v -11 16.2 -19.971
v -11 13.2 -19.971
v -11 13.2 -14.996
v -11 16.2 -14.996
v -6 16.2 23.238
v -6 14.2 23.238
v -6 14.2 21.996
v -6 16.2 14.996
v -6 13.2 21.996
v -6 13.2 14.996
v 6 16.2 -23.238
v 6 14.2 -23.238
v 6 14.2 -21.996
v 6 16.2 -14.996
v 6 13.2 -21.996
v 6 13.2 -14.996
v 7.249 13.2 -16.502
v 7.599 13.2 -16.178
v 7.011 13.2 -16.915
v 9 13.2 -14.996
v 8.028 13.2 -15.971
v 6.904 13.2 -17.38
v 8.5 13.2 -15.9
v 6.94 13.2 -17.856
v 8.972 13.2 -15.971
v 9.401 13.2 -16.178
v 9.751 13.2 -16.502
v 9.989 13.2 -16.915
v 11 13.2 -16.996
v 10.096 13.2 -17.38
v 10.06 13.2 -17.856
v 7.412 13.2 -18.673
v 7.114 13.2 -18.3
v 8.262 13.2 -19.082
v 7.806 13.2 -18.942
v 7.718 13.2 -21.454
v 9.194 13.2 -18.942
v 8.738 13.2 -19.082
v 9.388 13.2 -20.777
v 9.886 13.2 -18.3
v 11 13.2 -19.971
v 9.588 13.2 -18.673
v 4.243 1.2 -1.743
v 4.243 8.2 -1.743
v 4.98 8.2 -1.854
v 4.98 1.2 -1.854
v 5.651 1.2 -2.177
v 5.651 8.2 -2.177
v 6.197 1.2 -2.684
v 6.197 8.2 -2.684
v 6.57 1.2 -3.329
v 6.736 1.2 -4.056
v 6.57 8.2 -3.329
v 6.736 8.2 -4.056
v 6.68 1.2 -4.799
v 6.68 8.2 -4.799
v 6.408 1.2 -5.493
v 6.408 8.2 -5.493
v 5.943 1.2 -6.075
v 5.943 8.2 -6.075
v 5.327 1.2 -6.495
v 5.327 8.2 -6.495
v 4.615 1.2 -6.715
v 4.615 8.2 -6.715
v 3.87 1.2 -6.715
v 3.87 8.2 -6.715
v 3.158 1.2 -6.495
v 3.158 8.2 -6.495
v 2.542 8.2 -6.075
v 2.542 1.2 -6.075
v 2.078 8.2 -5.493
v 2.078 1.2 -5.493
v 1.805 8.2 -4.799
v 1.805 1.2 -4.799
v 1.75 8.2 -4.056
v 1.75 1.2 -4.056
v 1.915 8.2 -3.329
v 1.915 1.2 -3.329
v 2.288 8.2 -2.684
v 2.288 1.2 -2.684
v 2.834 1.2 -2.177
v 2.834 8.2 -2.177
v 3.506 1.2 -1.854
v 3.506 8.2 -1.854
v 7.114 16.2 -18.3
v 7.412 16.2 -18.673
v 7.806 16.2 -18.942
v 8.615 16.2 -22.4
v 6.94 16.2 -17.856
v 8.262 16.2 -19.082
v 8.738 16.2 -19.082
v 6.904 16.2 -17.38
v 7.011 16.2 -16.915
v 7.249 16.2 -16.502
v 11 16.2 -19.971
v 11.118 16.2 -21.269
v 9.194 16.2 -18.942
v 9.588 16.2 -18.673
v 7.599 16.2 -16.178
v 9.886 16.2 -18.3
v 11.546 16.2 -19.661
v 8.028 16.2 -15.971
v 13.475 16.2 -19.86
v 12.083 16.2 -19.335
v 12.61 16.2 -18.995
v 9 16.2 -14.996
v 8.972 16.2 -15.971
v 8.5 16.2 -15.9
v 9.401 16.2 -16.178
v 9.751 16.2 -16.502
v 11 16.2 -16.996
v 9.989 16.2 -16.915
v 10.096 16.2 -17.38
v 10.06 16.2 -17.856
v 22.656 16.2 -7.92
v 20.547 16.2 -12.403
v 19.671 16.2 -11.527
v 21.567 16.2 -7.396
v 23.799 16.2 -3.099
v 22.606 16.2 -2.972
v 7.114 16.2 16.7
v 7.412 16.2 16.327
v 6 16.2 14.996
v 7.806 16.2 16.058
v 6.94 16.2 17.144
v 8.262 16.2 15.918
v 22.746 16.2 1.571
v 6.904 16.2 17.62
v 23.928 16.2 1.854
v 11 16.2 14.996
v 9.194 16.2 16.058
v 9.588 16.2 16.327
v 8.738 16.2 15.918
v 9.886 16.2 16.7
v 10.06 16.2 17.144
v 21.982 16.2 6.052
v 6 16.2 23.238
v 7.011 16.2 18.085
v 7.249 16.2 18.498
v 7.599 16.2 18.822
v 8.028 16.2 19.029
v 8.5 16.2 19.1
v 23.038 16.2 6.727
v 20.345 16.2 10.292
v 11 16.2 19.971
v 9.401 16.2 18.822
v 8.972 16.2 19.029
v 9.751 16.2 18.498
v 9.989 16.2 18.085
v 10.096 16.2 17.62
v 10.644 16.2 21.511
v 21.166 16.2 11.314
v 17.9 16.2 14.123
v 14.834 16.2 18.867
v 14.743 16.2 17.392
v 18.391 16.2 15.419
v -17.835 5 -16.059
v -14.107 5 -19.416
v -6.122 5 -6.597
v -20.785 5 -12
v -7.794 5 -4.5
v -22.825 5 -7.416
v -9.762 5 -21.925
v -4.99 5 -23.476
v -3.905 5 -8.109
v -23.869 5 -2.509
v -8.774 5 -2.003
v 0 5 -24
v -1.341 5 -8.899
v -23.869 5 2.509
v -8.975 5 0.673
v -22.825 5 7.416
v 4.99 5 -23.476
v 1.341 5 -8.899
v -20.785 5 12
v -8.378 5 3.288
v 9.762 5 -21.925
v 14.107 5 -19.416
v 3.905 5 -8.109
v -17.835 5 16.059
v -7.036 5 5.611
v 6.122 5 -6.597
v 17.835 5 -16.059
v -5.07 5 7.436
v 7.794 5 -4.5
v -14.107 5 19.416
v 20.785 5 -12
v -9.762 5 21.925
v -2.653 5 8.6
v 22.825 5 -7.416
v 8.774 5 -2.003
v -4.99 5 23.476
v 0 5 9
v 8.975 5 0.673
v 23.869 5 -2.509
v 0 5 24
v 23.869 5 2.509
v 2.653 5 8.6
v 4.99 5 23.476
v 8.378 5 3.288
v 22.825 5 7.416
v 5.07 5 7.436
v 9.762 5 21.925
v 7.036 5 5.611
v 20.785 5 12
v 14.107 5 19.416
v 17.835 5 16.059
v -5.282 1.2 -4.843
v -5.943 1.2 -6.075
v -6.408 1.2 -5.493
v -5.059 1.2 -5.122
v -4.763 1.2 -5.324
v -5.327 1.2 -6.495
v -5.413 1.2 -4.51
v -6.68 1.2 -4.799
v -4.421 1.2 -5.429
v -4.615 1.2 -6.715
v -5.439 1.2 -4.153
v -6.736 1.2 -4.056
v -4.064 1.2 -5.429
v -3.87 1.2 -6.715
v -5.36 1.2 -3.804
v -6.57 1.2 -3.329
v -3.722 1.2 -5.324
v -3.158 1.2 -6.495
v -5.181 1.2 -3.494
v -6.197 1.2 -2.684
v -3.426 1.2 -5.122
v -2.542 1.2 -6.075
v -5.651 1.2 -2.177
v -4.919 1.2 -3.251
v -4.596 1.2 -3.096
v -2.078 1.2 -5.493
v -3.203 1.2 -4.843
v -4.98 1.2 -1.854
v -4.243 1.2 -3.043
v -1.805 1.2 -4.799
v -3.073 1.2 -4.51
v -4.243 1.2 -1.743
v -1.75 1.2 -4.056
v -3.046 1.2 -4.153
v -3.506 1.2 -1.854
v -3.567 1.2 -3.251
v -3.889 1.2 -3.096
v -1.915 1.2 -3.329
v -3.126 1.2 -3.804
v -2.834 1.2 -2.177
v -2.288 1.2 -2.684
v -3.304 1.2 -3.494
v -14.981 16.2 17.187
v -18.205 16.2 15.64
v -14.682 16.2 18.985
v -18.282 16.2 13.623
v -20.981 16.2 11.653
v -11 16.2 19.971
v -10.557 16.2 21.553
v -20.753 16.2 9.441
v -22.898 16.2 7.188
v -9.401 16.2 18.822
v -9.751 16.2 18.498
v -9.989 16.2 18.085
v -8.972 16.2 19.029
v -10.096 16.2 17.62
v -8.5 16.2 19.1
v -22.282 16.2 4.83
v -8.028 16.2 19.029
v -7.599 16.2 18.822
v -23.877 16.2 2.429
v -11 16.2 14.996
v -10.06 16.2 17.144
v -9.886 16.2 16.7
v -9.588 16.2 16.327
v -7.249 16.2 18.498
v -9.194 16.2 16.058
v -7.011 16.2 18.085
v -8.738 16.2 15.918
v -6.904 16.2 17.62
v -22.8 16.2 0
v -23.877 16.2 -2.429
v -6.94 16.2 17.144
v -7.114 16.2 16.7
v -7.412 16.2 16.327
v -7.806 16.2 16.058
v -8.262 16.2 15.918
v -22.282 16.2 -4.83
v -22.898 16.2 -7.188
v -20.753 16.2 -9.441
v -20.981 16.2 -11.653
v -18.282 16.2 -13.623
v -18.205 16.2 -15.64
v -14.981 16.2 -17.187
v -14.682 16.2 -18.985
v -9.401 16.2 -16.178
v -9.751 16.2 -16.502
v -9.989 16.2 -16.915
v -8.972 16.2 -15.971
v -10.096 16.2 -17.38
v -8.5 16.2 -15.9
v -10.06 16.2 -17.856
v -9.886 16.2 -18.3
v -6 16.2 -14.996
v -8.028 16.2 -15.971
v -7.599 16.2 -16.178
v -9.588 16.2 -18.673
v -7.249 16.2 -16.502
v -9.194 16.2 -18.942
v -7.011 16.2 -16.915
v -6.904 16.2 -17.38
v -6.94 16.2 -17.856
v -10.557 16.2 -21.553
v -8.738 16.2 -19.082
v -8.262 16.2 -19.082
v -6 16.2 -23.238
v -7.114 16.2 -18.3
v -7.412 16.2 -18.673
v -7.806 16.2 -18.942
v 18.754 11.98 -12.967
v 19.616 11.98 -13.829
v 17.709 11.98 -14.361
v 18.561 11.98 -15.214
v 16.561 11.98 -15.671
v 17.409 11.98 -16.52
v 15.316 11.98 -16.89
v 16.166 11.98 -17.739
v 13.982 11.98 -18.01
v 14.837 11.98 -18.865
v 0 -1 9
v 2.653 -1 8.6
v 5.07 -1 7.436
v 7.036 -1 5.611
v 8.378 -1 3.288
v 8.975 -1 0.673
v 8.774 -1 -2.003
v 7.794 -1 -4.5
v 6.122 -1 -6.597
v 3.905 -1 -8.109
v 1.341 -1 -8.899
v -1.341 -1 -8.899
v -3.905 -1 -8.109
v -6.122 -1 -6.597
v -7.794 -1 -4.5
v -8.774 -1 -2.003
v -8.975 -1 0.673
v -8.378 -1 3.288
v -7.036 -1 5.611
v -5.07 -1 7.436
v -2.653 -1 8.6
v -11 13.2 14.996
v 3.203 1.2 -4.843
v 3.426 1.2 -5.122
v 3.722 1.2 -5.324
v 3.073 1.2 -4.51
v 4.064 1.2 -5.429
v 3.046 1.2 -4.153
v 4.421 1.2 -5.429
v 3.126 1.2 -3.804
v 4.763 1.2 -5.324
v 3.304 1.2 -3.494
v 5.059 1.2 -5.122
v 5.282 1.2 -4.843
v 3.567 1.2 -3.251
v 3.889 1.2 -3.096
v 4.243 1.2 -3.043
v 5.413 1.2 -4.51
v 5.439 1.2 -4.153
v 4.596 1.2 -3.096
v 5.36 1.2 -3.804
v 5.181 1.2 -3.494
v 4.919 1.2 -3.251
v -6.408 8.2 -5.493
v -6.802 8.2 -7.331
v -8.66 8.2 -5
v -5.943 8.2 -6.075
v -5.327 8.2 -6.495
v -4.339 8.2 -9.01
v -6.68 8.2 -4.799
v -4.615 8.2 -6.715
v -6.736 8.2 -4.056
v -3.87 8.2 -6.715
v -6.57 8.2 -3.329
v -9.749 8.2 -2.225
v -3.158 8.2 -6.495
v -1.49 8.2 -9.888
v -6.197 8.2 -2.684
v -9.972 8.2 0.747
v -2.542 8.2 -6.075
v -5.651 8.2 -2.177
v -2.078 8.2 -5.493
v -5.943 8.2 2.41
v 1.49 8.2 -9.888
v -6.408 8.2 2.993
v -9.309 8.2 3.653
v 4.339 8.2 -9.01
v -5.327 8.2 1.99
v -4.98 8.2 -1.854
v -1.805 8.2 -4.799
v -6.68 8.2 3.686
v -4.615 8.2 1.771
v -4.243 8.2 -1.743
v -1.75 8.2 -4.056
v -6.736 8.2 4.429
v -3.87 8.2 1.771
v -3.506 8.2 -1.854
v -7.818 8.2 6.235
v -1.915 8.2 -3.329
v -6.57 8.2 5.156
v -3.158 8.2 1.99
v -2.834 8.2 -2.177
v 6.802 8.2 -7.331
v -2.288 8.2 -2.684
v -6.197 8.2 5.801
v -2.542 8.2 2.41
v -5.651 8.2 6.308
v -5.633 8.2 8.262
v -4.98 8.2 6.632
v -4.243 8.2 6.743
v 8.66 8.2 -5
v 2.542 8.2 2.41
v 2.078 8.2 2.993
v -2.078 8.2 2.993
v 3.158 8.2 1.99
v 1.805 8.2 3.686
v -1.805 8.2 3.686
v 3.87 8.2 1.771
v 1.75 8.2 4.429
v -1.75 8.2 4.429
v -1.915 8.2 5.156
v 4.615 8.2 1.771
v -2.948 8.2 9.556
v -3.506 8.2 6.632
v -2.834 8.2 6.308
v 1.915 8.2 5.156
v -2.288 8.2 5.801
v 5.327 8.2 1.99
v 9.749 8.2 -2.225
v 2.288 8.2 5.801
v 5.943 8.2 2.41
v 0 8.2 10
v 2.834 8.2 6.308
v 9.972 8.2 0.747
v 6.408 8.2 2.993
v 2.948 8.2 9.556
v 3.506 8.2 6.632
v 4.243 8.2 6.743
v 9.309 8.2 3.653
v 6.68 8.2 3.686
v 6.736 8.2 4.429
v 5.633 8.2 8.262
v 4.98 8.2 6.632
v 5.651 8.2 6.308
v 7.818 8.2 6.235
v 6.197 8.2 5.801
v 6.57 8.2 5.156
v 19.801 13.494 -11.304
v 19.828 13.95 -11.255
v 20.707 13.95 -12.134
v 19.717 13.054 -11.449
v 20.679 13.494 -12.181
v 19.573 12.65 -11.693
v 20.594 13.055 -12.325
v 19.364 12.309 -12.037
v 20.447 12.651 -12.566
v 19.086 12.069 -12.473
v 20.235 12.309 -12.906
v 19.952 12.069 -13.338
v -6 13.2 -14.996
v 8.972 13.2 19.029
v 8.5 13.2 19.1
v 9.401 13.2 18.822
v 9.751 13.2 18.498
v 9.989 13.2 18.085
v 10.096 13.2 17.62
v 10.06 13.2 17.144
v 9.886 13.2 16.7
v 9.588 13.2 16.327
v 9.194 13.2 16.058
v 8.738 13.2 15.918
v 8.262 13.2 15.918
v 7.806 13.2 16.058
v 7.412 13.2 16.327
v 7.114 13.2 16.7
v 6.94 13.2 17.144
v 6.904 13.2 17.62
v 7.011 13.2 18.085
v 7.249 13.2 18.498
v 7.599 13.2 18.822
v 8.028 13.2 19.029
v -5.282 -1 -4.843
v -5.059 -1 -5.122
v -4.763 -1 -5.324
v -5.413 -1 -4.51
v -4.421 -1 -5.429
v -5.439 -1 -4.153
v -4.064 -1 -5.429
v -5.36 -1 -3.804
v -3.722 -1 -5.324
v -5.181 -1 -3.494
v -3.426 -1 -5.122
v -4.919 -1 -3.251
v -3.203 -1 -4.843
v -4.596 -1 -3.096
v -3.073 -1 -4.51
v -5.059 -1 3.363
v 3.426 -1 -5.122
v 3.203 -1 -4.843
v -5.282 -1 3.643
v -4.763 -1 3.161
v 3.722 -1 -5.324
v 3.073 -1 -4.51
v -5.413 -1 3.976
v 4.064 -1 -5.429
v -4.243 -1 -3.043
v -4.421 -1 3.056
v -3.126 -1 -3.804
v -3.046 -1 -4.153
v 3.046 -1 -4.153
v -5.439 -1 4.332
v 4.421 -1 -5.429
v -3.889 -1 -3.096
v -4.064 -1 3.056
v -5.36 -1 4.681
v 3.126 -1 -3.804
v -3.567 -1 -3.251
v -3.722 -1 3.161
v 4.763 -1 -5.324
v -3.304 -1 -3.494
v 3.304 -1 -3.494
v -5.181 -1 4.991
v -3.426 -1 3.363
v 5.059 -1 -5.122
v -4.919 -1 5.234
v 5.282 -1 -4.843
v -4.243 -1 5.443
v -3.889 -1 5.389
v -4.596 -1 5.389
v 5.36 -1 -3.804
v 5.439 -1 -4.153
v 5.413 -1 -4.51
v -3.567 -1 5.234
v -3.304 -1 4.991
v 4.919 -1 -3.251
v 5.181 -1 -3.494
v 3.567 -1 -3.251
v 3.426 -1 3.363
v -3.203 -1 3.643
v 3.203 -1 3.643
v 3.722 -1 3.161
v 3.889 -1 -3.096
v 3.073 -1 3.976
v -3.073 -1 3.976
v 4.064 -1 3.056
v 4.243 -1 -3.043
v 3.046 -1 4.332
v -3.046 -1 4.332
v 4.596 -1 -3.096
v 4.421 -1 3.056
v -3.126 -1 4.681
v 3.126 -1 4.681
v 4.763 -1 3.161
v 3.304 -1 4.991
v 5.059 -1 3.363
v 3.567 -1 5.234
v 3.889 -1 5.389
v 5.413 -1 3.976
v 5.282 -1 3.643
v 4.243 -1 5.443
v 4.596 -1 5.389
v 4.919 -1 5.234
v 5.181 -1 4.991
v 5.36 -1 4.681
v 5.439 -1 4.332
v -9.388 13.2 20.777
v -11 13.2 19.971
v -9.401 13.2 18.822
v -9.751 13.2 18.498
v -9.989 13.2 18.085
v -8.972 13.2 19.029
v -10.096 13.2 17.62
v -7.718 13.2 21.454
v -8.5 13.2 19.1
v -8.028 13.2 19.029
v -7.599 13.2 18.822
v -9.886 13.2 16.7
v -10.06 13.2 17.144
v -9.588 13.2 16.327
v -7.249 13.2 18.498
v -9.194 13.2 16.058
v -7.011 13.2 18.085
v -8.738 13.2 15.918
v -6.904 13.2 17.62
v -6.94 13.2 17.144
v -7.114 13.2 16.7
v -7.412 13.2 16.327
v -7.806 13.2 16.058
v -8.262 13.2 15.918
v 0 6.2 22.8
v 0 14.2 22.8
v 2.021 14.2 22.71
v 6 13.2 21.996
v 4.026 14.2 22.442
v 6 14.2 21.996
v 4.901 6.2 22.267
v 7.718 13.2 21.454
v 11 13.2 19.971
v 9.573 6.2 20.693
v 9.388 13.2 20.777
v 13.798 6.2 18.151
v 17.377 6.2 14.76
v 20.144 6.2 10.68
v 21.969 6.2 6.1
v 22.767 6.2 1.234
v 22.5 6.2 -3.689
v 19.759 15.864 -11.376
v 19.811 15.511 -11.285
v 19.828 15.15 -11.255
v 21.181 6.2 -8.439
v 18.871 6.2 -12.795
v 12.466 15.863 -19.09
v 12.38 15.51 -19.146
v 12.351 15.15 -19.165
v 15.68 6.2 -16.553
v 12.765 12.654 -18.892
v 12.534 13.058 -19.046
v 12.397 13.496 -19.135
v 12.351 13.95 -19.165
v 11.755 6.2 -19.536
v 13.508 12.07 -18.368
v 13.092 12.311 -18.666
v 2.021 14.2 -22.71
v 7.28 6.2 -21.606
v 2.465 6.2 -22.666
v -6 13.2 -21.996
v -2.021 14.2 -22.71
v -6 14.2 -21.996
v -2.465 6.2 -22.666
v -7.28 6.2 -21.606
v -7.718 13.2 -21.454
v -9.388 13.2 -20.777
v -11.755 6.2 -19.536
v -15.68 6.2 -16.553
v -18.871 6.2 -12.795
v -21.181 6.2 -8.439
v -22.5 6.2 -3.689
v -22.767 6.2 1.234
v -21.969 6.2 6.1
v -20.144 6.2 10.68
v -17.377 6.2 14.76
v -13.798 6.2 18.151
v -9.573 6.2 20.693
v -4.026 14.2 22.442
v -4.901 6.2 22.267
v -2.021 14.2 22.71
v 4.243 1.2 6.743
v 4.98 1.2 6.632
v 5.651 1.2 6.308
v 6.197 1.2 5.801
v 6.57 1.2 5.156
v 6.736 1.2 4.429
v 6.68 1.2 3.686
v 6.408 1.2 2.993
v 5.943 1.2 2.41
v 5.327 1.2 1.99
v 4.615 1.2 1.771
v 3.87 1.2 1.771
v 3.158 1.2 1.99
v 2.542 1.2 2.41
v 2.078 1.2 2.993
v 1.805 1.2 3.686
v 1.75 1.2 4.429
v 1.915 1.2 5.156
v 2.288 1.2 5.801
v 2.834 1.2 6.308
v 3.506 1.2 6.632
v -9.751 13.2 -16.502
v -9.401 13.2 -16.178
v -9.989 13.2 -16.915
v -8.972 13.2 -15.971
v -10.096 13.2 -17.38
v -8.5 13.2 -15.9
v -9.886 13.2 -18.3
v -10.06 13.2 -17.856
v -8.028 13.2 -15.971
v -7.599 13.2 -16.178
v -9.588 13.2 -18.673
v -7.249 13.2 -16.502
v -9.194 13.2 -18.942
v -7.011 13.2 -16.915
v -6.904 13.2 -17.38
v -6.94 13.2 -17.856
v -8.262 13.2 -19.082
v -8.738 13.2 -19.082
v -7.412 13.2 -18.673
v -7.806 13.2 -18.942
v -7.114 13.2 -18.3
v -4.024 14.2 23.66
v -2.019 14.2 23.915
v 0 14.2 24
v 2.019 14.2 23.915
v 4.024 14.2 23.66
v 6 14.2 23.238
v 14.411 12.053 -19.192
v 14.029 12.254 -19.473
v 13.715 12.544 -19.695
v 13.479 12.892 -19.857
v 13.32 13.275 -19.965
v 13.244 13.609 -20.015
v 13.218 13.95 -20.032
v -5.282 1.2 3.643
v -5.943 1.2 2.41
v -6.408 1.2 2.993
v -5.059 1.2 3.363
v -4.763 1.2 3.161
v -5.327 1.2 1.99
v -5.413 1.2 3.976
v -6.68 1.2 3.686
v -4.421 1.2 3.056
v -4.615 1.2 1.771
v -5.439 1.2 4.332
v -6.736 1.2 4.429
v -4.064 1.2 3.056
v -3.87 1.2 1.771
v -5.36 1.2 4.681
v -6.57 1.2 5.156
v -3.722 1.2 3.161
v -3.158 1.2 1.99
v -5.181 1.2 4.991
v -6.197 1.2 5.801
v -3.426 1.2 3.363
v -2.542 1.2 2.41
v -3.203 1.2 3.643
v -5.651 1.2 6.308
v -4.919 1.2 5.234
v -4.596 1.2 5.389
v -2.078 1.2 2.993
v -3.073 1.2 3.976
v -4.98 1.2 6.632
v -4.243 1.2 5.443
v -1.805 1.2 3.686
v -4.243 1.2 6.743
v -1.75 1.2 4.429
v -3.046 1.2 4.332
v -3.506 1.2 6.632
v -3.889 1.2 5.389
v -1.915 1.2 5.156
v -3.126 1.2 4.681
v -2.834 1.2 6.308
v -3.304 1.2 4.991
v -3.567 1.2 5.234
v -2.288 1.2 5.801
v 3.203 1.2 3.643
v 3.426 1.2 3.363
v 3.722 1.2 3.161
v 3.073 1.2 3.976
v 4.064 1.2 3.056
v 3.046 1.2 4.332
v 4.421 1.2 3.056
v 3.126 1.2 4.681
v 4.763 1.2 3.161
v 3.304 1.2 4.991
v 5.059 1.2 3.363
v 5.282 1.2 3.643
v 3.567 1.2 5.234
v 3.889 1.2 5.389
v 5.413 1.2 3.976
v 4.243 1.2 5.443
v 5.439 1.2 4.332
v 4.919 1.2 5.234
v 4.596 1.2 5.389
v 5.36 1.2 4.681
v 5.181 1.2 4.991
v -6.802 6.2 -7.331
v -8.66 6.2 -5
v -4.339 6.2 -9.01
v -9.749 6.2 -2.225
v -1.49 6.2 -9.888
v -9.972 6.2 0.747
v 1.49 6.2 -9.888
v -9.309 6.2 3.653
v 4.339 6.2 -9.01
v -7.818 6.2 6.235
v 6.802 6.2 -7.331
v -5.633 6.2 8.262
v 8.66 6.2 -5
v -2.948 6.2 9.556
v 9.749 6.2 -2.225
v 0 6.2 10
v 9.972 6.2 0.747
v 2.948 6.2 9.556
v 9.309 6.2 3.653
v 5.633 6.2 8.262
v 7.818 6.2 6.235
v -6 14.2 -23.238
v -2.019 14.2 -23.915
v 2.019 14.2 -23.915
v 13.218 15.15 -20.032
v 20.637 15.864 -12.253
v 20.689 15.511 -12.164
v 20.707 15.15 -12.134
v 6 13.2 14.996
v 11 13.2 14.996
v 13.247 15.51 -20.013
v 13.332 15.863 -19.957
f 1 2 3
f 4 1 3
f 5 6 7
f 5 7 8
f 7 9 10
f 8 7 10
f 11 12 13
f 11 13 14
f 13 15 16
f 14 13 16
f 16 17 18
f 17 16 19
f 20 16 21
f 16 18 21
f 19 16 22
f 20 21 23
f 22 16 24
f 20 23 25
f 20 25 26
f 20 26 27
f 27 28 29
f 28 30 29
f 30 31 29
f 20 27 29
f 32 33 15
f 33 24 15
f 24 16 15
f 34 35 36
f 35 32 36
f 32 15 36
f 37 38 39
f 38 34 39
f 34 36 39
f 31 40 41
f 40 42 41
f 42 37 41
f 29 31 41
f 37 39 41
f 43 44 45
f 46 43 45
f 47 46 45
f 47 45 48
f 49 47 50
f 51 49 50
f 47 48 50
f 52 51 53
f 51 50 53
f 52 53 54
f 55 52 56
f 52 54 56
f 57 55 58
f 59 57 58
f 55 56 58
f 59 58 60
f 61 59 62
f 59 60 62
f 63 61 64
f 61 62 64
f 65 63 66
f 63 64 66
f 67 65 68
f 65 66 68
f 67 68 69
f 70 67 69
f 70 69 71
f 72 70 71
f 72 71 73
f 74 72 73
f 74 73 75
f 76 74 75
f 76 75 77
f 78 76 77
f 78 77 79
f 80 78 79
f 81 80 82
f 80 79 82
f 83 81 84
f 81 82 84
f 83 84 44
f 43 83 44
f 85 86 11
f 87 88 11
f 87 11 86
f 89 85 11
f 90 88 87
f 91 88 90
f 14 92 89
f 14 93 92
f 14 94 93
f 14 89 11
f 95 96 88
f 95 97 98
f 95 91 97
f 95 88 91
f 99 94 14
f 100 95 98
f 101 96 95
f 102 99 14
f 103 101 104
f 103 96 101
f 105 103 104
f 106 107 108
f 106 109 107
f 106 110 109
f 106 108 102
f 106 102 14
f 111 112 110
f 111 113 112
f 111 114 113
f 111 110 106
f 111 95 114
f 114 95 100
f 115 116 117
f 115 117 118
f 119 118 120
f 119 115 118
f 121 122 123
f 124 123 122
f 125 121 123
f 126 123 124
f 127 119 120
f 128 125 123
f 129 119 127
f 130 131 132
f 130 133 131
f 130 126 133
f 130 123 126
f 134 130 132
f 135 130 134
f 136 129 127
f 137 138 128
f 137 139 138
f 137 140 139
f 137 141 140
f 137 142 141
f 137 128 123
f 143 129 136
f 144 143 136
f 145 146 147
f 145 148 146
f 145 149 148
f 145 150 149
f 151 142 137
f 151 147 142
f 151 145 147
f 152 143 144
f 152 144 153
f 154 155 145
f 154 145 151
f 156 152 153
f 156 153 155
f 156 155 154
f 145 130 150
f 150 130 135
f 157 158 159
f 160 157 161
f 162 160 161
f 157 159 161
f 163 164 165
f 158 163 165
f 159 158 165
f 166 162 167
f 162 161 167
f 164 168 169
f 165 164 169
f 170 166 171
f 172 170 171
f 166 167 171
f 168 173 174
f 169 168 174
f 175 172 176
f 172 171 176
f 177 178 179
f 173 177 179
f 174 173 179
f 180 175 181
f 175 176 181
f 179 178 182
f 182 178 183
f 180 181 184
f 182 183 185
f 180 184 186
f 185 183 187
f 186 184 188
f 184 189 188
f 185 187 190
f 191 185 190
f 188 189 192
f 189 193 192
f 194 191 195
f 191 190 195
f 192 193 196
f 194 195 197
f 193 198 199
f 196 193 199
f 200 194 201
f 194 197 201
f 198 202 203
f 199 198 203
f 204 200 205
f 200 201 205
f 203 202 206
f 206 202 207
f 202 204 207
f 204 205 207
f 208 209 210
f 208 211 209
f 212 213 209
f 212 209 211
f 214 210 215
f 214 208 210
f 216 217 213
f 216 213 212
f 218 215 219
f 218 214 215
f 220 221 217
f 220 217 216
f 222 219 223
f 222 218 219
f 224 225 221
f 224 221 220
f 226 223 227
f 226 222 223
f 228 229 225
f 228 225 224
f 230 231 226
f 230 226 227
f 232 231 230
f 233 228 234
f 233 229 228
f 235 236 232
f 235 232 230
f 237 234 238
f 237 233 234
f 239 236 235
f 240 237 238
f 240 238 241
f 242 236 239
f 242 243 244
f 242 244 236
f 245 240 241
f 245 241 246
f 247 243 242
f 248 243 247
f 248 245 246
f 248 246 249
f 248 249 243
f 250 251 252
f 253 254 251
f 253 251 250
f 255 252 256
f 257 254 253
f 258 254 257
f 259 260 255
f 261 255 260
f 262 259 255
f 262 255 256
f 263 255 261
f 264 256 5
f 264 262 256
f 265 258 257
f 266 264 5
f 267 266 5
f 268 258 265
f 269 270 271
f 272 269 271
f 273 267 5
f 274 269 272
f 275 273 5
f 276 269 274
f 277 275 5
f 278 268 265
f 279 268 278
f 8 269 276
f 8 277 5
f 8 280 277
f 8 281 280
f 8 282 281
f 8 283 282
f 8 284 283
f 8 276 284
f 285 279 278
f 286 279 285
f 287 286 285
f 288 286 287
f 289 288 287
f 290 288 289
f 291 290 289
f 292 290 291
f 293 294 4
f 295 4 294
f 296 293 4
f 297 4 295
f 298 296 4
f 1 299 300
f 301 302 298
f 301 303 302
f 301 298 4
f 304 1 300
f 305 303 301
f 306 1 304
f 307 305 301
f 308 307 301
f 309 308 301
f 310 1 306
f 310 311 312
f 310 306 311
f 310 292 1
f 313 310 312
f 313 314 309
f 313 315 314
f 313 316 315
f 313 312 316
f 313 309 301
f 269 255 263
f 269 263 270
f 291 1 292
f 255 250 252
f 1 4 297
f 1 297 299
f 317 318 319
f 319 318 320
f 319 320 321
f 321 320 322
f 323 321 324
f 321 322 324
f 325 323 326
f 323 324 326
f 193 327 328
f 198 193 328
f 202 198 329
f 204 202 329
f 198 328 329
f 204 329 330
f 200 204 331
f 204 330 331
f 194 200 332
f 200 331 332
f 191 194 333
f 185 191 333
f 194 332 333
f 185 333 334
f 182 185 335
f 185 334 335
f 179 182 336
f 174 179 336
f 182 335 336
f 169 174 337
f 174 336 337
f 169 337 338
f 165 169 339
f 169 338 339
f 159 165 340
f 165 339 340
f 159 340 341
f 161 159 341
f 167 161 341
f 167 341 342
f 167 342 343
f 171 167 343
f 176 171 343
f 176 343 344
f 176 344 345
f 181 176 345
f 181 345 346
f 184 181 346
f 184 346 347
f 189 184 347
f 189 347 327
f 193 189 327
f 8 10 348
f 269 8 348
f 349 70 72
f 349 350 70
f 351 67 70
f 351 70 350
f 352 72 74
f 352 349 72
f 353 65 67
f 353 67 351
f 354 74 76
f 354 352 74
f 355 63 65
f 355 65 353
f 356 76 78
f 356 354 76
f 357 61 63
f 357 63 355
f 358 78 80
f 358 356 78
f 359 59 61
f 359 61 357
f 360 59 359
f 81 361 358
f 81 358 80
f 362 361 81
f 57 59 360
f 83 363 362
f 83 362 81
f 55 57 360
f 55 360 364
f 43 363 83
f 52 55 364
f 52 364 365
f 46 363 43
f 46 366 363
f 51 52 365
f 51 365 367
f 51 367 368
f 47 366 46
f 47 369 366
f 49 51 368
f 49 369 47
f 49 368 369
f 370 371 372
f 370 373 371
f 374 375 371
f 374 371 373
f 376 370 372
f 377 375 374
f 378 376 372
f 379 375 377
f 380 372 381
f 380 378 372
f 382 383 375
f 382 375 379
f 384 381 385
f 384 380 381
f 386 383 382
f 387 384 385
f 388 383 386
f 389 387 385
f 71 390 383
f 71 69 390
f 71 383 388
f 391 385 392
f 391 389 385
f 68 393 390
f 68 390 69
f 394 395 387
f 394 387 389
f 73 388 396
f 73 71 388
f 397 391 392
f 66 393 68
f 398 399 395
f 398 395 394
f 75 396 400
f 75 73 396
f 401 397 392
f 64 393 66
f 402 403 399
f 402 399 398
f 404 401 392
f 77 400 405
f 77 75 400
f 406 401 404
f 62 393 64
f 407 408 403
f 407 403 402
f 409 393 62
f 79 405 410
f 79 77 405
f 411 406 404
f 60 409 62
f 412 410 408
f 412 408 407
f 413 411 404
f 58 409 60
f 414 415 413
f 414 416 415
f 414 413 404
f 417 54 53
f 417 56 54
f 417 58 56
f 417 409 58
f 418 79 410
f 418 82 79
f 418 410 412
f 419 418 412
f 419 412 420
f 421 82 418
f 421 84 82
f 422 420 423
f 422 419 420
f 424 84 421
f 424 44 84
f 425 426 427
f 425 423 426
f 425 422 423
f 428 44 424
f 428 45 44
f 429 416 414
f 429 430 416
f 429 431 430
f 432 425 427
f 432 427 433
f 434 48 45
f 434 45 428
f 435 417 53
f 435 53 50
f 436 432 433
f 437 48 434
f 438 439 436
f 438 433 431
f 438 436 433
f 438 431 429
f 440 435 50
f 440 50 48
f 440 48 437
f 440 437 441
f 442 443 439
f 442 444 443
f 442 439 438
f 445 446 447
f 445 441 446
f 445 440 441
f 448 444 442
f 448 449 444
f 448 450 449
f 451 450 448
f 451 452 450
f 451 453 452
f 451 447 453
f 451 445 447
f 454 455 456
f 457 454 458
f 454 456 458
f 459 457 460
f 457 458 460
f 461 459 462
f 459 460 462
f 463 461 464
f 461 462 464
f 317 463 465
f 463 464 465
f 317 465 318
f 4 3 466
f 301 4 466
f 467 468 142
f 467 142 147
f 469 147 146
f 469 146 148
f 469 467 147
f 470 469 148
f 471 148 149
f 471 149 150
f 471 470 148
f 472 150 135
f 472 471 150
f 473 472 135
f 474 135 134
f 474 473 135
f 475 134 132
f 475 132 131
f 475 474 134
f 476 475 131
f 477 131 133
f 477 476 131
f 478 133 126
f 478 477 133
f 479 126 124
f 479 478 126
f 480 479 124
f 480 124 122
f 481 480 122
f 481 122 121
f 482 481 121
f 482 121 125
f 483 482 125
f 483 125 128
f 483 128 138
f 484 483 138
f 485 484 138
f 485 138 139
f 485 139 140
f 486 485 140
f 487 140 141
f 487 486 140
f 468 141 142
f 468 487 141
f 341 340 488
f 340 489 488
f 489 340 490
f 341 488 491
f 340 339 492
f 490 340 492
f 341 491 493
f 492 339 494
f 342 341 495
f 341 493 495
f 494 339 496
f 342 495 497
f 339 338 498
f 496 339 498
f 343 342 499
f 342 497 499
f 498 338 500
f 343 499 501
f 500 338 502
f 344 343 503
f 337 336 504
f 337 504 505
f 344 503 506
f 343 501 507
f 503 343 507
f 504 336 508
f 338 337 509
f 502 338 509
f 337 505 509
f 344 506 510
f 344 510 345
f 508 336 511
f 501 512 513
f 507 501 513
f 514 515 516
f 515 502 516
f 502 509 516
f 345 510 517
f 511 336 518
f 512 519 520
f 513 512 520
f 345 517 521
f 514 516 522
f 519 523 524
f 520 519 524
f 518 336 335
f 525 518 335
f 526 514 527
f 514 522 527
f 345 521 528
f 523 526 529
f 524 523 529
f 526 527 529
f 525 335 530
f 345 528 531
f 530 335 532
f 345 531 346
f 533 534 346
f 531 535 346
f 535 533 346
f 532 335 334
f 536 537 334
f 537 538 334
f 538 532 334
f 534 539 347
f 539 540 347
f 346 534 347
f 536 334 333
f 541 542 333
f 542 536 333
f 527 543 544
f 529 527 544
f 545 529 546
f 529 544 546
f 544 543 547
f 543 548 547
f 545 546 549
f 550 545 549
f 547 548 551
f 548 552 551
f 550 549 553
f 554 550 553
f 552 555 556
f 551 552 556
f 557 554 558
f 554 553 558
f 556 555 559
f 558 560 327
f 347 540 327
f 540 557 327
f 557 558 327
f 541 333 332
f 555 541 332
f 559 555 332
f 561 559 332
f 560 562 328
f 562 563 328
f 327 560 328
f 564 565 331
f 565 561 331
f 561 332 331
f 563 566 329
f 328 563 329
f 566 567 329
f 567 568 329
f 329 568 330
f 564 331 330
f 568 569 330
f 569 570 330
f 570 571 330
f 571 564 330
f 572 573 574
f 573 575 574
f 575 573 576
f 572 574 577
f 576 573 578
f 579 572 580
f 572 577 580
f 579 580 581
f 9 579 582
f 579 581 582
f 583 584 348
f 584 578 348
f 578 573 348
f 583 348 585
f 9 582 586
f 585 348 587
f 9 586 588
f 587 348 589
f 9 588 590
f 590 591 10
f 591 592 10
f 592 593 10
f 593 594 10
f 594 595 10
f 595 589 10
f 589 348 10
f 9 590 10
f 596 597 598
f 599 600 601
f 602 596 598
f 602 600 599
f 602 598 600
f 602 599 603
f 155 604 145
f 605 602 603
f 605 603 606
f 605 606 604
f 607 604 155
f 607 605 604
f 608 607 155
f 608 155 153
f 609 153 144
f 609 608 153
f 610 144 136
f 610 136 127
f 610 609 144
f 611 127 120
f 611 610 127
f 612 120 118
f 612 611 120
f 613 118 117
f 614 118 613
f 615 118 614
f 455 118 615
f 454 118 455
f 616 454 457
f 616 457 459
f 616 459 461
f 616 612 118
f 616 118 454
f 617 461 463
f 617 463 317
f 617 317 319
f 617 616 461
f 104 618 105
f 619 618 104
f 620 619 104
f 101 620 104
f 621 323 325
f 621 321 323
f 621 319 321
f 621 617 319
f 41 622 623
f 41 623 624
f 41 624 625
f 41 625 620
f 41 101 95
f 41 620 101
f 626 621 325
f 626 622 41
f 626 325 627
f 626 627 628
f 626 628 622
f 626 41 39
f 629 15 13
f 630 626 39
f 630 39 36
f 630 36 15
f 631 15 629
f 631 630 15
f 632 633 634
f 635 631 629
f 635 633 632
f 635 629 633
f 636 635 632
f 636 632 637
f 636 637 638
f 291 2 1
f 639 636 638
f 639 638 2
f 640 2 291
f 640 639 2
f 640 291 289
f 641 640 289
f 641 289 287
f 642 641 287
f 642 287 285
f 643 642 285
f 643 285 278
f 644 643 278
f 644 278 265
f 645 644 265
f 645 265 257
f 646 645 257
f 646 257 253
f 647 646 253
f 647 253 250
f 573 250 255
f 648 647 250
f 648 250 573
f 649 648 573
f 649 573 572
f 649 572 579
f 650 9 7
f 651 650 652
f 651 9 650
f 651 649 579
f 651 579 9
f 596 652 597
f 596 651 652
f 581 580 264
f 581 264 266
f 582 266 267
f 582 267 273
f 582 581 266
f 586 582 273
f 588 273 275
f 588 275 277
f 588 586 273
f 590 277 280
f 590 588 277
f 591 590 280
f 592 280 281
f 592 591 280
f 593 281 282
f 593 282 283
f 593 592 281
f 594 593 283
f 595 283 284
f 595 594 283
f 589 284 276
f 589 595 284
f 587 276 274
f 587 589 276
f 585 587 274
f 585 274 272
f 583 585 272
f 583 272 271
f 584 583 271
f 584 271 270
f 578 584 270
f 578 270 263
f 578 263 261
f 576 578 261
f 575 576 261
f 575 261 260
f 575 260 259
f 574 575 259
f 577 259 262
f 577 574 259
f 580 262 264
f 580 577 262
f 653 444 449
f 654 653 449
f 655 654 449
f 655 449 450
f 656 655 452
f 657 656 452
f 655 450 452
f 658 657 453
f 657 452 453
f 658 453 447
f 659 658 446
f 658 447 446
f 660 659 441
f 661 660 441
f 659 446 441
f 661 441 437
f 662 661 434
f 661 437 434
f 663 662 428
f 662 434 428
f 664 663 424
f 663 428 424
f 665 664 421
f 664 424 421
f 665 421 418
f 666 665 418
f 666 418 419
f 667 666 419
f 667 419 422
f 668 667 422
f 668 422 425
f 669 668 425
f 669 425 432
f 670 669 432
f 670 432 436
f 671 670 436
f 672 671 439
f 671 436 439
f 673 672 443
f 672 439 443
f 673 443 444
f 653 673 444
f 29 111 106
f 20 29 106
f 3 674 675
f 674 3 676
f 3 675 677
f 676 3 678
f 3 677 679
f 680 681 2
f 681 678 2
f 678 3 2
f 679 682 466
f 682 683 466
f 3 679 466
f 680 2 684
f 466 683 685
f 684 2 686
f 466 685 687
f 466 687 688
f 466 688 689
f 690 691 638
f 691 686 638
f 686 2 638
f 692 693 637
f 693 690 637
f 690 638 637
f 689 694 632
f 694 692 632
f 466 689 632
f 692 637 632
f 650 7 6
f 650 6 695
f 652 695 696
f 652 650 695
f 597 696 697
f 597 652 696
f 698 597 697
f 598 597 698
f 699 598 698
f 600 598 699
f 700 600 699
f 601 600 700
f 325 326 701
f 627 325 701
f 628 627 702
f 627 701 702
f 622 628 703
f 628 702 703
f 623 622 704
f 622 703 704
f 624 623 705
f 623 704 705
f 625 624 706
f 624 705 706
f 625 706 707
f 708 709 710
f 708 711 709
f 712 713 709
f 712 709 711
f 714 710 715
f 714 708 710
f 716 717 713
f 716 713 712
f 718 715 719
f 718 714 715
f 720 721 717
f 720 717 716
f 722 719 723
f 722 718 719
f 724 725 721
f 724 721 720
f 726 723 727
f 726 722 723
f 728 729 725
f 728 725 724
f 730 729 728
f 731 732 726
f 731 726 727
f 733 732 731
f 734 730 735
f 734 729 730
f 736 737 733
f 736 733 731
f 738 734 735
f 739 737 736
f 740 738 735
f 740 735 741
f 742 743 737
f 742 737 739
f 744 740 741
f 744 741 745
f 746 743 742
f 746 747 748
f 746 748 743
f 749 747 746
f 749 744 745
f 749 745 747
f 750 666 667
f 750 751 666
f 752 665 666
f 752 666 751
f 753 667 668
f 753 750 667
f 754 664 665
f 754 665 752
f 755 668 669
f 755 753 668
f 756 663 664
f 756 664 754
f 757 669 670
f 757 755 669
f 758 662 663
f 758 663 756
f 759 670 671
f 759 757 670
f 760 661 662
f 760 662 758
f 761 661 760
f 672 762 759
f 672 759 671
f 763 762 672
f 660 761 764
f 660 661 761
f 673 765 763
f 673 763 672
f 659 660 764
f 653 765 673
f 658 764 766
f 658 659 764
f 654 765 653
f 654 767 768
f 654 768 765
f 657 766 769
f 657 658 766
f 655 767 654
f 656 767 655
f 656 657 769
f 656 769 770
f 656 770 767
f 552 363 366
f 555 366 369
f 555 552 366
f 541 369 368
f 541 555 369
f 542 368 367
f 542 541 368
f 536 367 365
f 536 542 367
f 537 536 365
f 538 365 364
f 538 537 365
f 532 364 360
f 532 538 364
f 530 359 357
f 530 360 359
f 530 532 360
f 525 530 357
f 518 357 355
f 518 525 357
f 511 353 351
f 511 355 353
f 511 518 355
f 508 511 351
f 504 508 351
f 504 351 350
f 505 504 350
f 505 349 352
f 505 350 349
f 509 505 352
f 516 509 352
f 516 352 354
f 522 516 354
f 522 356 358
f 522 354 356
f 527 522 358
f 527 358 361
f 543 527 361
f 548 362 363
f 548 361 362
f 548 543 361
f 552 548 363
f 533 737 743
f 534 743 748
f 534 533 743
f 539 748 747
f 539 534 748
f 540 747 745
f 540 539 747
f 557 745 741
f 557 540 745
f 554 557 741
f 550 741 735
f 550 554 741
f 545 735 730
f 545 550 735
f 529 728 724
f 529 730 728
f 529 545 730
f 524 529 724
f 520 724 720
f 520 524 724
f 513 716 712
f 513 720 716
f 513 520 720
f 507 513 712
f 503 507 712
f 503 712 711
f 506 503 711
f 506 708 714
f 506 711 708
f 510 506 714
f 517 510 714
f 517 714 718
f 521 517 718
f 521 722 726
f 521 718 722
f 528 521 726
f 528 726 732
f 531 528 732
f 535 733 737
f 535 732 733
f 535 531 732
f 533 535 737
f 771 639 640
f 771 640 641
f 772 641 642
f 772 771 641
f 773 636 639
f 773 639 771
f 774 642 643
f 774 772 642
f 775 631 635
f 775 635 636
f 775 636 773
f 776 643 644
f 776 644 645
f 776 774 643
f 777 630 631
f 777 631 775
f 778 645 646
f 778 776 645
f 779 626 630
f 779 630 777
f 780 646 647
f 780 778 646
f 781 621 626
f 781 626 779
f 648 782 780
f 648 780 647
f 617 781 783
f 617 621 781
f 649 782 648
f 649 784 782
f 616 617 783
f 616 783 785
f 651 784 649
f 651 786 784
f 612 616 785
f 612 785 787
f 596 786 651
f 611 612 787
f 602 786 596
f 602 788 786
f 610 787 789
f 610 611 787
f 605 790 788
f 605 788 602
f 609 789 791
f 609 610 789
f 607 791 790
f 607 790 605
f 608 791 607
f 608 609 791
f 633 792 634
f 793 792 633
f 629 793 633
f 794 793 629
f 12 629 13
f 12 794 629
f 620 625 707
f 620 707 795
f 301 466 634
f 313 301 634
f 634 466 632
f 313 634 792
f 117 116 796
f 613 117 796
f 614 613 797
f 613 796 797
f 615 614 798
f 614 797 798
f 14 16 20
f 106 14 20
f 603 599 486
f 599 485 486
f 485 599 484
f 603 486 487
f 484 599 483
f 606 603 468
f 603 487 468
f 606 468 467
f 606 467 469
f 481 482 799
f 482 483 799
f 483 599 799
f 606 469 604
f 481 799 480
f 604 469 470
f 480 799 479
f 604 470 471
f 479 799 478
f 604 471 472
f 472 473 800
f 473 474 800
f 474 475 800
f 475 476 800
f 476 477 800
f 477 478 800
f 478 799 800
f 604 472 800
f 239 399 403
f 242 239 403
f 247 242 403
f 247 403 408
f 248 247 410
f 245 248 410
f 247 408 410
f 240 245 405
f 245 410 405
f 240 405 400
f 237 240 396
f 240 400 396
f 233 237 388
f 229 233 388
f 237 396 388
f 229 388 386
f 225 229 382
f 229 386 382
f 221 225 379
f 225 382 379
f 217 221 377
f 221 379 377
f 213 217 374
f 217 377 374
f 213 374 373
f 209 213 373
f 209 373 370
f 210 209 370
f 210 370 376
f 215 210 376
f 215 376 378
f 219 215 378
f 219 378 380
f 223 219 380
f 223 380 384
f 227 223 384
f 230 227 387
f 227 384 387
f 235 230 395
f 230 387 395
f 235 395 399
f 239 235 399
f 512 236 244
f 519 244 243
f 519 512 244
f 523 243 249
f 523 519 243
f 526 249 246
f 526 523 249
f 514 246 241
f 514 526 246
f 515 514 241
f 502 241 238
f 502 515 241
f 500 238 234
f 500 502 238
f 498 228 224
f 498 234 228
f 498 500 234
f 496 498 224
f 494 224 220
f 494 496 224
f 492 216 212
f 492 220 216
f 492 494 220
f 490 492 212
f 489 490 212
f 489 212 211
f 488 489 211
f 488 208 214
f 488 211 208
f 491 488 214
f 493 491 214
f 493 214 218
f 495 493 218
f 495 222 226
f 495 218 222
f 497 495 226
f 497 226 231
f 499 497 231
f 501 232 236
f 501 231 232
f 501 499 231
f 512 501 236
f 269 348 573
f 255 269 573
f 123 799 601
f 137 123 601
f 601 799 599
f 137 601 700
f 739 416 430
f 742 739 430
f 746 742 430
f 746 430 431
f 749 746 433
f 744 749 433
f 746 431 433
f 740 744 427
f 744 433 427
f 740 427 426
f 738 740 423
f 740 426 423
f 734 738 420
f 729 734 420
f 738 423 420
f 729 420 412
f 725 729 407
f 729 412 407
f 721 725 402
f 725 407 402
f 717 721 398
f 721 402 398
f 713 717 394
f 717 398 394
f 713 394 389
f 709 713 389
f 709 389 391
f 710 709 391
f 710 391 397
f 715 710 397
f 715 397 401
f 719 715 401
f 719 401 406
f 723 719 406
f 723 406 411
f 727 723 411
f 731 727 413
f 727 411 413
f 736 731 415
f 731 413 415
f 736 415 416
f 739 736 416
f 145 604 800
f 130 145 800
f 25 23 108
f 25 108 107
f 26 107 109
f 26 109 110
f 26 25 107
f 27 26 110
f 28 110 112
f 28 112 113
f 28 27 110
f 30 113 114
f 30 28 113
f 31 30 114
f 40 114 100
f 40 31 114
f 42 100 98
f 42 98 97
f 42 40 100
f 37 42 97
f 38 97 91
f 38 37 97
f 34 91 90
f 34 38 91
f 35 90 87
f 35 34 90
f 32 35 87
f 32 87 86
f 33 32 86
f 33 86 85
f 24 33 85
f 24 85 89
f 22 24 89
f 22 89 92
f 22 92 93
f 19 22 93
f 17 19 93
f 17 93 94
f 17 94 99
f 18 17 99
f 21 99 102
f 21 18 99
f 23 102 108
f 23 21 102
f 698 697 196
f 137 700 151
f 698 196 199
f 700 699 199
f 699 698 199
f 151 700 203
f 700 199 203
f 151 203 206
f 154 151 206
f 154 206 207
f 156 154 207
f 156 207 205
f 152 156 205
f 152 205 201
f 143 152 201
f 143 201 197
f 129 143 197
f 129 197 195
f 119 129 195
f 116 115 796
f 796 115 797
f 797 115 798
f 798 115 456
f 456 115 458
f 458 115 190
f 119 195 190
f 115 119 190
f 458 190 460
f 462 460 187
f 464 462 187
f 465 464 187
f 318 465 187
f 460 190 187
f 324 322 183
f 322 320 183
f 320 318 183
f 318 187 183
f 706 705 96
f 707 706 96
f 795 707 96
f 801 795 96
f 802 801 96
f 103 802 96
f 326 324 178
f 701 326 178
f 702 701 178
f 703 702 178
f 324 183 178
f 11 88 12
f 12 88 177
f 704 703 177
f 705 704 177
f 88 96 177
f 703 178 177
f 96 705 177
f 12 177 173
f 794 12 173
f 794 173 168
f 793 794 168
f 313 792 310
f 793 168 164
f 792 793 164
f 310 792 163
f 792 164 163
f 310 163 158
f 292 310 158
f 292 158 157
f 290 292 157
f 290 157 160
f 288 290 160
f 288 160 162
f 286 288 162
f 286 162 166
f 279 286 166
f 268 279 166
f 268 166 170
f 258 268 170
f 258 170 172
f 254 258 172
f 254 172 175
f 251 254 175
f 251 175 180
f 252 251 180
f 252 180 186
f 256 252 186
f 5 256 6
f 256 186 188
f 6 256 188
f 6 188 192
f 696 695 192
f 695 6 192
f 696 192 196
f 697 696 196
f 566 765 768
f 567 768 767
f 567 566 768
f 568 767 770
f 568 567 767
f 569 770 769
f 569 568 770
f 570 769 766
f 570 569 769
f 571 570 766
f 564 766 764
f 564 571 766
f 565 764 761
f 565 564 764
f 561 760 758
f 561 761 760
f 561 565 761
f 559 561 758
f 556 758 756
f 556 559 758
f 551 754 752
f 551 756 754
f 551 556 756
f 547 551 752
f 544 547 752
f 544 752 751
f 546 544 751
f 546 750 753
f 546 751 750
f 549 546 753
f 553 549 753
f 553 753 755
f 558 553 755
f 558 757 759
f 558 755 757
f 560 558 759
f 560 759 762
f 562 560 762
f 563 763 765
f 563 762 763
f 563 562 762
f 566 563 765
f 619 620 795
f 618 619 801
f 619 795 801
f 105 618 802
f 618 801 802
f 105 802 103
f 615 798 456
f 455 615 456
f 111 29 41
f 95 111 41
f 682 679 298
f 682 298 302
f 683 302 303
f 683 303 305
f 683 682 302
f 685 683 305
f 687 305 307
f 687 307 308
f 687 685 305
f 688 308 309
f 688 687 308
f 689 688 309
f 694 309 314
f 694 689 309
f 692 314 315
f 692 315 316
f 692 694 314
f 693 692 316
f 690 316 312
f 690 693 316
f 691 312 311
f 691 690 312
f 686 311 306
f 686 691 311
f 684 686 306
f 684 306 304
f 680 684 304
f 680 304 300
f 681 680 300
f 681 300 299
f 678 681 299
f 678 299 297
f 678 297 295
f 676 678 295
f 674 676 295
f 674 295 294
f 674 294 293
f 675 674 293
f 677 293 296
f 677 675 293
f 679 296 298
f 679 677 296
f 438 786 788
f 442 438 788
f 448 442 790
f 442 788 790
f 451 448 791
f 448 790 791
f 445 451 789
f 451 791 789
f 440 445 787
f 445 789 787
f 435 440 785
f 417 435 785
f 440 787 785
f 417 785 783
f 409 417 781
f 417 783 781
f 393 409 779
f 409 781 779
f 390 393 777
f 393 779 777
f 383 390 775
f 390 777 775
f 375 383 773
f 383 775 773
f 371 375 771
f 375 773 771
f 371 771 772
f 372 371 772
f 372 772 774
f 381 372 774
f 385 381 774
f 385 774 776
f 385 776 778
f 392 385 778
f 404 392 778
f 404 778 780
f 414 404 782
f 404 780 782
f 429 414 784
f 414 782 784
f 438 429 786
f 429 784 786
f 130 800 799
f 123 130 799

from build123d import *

# Parameters (mm, degrees)
SKETCH1_R           = 9
SKETCH1_R_2         = 1.2
BOSS_EXTRUDE1_DEPTH = 5
SKETCH2_R           = 24
BOSS_EXTRUDE2_DEPTH = 1.2
SKETCH4_R           = 1.2
CUT_EXTRUDE1_DEPTH  = 35.307433597
SKETCH5_R           = 10
SKETCH5_R_2         = 1.2
BOSS_EXTRUDE4_DEPTH = 2
SKETCH6_R           = 24
SKETCH6_R_2         = 22.8
BOSS_EXTRUDE5_DEPTH = 10
SKETCH7_W           = 12
SKETCH7_H           = 48
CUT_EXTRUDE2_DEPTH  = 2
BOSS_EXTRUDE6_START = -3
SKETCH9_R           = 1.6
BOSS_EXTRUDE6_DEPTH = 3
SKETCH10_R          = 2.5
CUT_EXTRUDE3_DEPTH  = 7
BOSS_EXTRUDE7_START = -1
SKETCH1_2_R         = 9
SKETCH1_2_R_2       = 1.2
BOSS_EXTRUDE7_DEPTH = 1
CUT_EXTRUDE4_DEPTH  = 5
SKETCH18_OUTSIDE_W  = 64.006
SKETCH18_OUTSIDE_H  = 64.006
SKETCH18_OUTSIDE_R  = 24
CUT_EXTRUDE5_DEPTH  = 5


with BuildPart() as part:
    # Sketch1 → Boss-Extrude1 (new body)
    with BuildSketch(Plane(origin=(0, 0, 0), x_dir=(1, 0, 0), z_dir=(0, 1, 0))):
        Circle(SKETCH1_R)
        with Locations((4.242640687, 4.242640687)):
            Circle(SKETCH1_R_2, mode=Mode.SUBTRACT)
        with Locations((-4.242640687, 4.242640687)):
            Circle(SKETCH1_R_2, mode=Mode.SUBTRACT)
        with Locations((4.242640687, -4.242640687)):
            Circle(SKETCH1_R_2, mode=Mode.SUBTRACT)
        with Locations((-4.242640687, -4.242640687)):
            Circle(SKETCH1_R_2, mode=Mode.SUBTRACT)
    extrude(amount=BOSS_EXTRUDE1_DEPTH)

    # Sketch2 → Boss-Extrude2 (add)
    with BuildSketch(Plane(origin=(0, 5, 0), x_dir=(1, 0, 0), z_dir=(0, 1, 0))):
        Circle(SKETCH2_R)
    extrude(amount=BOSS_EXTRUDE2_DEPTH)

    # Sketch4 → Cut-Extrude1 (cut, through all)
    with BuildSketch(Plane.XZ.offset(-5)):
        with Locations((-4.242640687, -4.242640687)):
            Circle(SKETCH4_R)
        with Locations((4.242640687, -4.242640687)):
            Circle(SKETCH4_R)
        with Locations((4.242640687, 4.242640687)):
            Circle(SKETCH4_R)
        with Locations((-4.242640687, 4.242640687)):
            Circle(SKETCH4_R)
    extrude(amount=-CUT_EXTRUDE1_DEPTH, mode=Mode.SUBTRACT)

    # Sketch5 → Boss-Extrude4 (add)
    with BuildSketch(Plane(origin=(0, 6.2, 0), x_dir=(1, 0, 0), z_dir=(0, 1, 0))):
        Circle(SKETCH5_R)
        with Locations((4.242640687, -4.242640687)):
            Circle(SKETCH5_R_2, mode=Mode.SUBTRACT)
        with Locations((-4.242640687, -4.242640687)):
            Circle(SKETCH5_R_2, mode=Mode.SUBTRACT)
        with Locations((-4.242640687, 4.242640687)):
            Circle(SKETCH5_R_2, mode=Mode.SUBTRACT)
        with Locations((4.242640687, 4.242640687)):
            Circle(SKETCH5_R_2, mode=Mode.SUBTRACT)
    extrude(amount=BOSS_EXTRUDE4_DEPTH)

    # Sketch6 → Boss-Extrude5 (add)
    with BuildSketch(Plane(origin=(0, 6.2, 0), x_dir=(1, 0, 0), z_dir=(0, 1, 0))):
        Circle(SKETCH6_R)
        Circle(SKETCH6_R_2, mode=Mode.SUBTRACT)
    extrude(amount=BOSS_EXTRUDE5_DEPTH)

    # Sketch7 → Cut-Extrude2 (cut)
    with BuildSketch(Plane(origin=(0, 16.2, 0), x_dir=(1, 0, 0), z_dir=(0, 1, 0))):
        Rectangle(SKETCH7_W, SKETCH7_H)
    extrude(amount=-CUT_EXTRUDE2_DEPTH, mode=Mode.SUBTRACT)

    # Sketch9 → Boss-Extrude6 (add)
    # profile 1 of 4: a face of its own
    with BuildSketch(Plane(origin=(0, 16.2, 0), x_dir=(1, 0, 0), z_dir=(0, 1, 0)).offset(BOSS_EXTRUDE6_START)):
        with BuildLine():
            Line((-6, 14.996363336), (-6, 21.996363336))
            ThreePointArc((-6, 21.996363336), (-8.560113637, 21.132071704), (-11, 19.970978944))
            Line((-11, 19.970978944), (-11, 14.996363336))
            Line((-11, 14.996363336), (-6, 14.996363336))
        make_face()
        with Locations((-8.5, 17.5)):
            Circle(SKETCH9_R, mode=Mode.SUBTRACT)
    # profile 2 of 4: a face of its own
    with BuildSketch(Plane(origin=(0, 16.2, 0), x_dir=(1, 0, 0), z_dir=(0, 1, 0)).offset(BOSS_EXTRUDE6_START)):
        with BuildLine():
            ThreePointArc((11, 19.970978944), (8.560113637, 21.132071704), (6, 21.996363336))
            Line((6, 21.996363336), (6, 14.996363336))
            Line((6, 14.996363336), (11, 14.996363336))
            Line((11, 14.996363336), (11, 19.970978944))
        make_face()
        with Locations((8.5, 17.5)):
            Circle(SKETCH9_R, mode=Mode.SUBTRACT)
    # profile 3 of 4: a face of its own
    with BuildSketch(Plane(origin=(0, 16.2, 0), x_dir=(1, 0, 0), z_dir=(0, 1, 0)).offset(BOSS_EXTRUDE6_START)):
        with BuildLine():
            Line((-11, -14.996363336), (-11, -19.970978944))
            ThreePointArc((-11, -19.970978944), (-8.560113637, -21.132071704), (-6, -21.996363336))
            Line((-6, -21.996363336), (-6, -14.996363336))
            Line((-6, -14.996363336), (-11, -14.996363336))
        make_face()
        with Locations((-8.5, -17.5)):
            Circle(SKETCH9_R, mode=Mode.SUBTRACT)
    # profile 4 of 4: a face of its own
    with BuildSketch(Plane(origin=(0, 16.2, 0), x_dir=(1, 0, 0), z_dir=(0, 1, 0)).offset(BOSS_EXTRUDE6_START)):
        with BuildLine():
            ThreePointArc((6, -21.996363336), (8.560113637, -21.132071704), (11, -19.970978944))
            Line((11, -19.970978944), (11, -14.996363336))
            Line((11, -14.996363336), (6, -14.996363336))
            Line((6, -14.996363336), (6, -21.996363336))
        make_face()
        with Locations((8.5, -17.5)):
            Circle(SKETCH9_R, mode=Mode.SUBTRACT)
    extrude(amount=BOSS_EXTRUDE6_DEPTH)

    # Sketch10 → Cut-Extrude3 (cut)
    with BuildSketch(Plane(origin=(0, 8.2, 0), x_dir=(1, 0, 0), z_dir=(0, 1, 0))):
        with Locations((4.242640687, 4.242640687)):
            Circle(SKETCH10_R)
        with Locations((4.242640687, -4.242640687)):
            Circle(SKETCH10_R)
        with Locations((-4.242640687, -4.242640687)):
            Circle(SKETCH10_R)
        with Locations((-4.242640687, 4.242640687)):
            Circle(SKETCH10_R)
    extrude(amount=-CUT_EXTRUDE3_DEPTH, mode=Mode.SUBTRACT)

    # Sketch1<2> → Boss-Extrude7 (add)
    with BuildSketch(Plane(origin=(0, 0, 0), x_dir=(1, 0, 0), z_dir=(0, 1, 0)).offset(BOSS_EXTRUDE7_START)):
        Circle(SKETCH1_2_R)
        with Locations((4.242640687, 4.242640687)):
            Circle(SKETCH1_2_R_2, mode=Mode.SUBTRACT)
        with Locations((-4.242640687, 4.242640687)):
            Circle(SKETCH1_2_R_2, mode=Mode.SUBTRACT)
        with Locations((4.242640687, -4.242640687)):
            Circle(SKETCH1_2_R_2, mode=Mode.SUBTRACT)
        with Locations((-4.242640687, -4.242640687)):
            Circle(SKETCH1_2_R_2, mode=Mode.SUBTRACT)
    extrude(amount=BOSS_EXTRUDE7_DEPTH)

    # Sketch15 → Cut-Extrude4 (cut)
    with BuildSketch(Plane(origin=(18.32105018, 1.602e-06, -18.32105018), x_dir=(-0.7071067811865515, 6.181721199999928e-08, -0.7071067811865409), z_dir=(0.7071067811865437, 6.181721199999997e-08, -0.7071067811865488))):
        with BuildLine():
            Line((-4.091985108, 11.979999846), (2.848014892, 11.979998988))
            ThreePointArc((2.848014892, 11.979998988), (4.241015323, 12.556998456), (4.818015136, 13.949998744))
            Line((4.818015136, 13.949998744), (4.818015284, 15.149998744))
            ThreePointArc((4.818015284, 15.149998744), (4.241015815, 16.542999174), (2.848015528, 17.119998988))
            Line((2.848015528, 17.119998988), (-4.091984472, 17.119999846))
            ThreePointArc((-4.091984472, 17.119999846), (-5.484984903, 16.543000377), (-6.061984716, 15.150000089))
            Line((-6.061984716, 15.150000089), (-6.061984864, 13.950000089))
            ThreePointArc((-6.061984864, 13.950000089), (-5.484985395, 12.556999659), (-4.091985108, 11.979999846))
        make_face()
    extrude(amount=-CUT_EXTRUDE4_DEPTH, mode=Mode.SUBTRACT)

    # Sketch18 outside → Cut-Extrude5 (cut)
    # profile 1 of 2: a face of its own
    with BuildSketch(Plane(origin=(0, 16.2, 0), x_dir=(1, 0, 0), z_dir=(0, 1, 0))):
        Rectangle(SKETCH18_OUTSIDE_W, SKETCH18_OUTSIDE_H)
        Circle(SKETCH18_OUTSIDE_R, mode=Mode.SUBTRACT)
    # profile 2 of 2: a face of its own
    with BuildSketch(Plane(origin=(0, 16.2, 0), x_dir=(1, 0, 0), z_dir=(0, 1, 0))):
        Polygon((11, 16.996363336), (9, 14.996363336), (11, 14.996363336), align=None)
    extrude(amount=-CUT_EXTRUDE5_DEPTH, mode=Mode.SUBTRACT)


solid = part.part
